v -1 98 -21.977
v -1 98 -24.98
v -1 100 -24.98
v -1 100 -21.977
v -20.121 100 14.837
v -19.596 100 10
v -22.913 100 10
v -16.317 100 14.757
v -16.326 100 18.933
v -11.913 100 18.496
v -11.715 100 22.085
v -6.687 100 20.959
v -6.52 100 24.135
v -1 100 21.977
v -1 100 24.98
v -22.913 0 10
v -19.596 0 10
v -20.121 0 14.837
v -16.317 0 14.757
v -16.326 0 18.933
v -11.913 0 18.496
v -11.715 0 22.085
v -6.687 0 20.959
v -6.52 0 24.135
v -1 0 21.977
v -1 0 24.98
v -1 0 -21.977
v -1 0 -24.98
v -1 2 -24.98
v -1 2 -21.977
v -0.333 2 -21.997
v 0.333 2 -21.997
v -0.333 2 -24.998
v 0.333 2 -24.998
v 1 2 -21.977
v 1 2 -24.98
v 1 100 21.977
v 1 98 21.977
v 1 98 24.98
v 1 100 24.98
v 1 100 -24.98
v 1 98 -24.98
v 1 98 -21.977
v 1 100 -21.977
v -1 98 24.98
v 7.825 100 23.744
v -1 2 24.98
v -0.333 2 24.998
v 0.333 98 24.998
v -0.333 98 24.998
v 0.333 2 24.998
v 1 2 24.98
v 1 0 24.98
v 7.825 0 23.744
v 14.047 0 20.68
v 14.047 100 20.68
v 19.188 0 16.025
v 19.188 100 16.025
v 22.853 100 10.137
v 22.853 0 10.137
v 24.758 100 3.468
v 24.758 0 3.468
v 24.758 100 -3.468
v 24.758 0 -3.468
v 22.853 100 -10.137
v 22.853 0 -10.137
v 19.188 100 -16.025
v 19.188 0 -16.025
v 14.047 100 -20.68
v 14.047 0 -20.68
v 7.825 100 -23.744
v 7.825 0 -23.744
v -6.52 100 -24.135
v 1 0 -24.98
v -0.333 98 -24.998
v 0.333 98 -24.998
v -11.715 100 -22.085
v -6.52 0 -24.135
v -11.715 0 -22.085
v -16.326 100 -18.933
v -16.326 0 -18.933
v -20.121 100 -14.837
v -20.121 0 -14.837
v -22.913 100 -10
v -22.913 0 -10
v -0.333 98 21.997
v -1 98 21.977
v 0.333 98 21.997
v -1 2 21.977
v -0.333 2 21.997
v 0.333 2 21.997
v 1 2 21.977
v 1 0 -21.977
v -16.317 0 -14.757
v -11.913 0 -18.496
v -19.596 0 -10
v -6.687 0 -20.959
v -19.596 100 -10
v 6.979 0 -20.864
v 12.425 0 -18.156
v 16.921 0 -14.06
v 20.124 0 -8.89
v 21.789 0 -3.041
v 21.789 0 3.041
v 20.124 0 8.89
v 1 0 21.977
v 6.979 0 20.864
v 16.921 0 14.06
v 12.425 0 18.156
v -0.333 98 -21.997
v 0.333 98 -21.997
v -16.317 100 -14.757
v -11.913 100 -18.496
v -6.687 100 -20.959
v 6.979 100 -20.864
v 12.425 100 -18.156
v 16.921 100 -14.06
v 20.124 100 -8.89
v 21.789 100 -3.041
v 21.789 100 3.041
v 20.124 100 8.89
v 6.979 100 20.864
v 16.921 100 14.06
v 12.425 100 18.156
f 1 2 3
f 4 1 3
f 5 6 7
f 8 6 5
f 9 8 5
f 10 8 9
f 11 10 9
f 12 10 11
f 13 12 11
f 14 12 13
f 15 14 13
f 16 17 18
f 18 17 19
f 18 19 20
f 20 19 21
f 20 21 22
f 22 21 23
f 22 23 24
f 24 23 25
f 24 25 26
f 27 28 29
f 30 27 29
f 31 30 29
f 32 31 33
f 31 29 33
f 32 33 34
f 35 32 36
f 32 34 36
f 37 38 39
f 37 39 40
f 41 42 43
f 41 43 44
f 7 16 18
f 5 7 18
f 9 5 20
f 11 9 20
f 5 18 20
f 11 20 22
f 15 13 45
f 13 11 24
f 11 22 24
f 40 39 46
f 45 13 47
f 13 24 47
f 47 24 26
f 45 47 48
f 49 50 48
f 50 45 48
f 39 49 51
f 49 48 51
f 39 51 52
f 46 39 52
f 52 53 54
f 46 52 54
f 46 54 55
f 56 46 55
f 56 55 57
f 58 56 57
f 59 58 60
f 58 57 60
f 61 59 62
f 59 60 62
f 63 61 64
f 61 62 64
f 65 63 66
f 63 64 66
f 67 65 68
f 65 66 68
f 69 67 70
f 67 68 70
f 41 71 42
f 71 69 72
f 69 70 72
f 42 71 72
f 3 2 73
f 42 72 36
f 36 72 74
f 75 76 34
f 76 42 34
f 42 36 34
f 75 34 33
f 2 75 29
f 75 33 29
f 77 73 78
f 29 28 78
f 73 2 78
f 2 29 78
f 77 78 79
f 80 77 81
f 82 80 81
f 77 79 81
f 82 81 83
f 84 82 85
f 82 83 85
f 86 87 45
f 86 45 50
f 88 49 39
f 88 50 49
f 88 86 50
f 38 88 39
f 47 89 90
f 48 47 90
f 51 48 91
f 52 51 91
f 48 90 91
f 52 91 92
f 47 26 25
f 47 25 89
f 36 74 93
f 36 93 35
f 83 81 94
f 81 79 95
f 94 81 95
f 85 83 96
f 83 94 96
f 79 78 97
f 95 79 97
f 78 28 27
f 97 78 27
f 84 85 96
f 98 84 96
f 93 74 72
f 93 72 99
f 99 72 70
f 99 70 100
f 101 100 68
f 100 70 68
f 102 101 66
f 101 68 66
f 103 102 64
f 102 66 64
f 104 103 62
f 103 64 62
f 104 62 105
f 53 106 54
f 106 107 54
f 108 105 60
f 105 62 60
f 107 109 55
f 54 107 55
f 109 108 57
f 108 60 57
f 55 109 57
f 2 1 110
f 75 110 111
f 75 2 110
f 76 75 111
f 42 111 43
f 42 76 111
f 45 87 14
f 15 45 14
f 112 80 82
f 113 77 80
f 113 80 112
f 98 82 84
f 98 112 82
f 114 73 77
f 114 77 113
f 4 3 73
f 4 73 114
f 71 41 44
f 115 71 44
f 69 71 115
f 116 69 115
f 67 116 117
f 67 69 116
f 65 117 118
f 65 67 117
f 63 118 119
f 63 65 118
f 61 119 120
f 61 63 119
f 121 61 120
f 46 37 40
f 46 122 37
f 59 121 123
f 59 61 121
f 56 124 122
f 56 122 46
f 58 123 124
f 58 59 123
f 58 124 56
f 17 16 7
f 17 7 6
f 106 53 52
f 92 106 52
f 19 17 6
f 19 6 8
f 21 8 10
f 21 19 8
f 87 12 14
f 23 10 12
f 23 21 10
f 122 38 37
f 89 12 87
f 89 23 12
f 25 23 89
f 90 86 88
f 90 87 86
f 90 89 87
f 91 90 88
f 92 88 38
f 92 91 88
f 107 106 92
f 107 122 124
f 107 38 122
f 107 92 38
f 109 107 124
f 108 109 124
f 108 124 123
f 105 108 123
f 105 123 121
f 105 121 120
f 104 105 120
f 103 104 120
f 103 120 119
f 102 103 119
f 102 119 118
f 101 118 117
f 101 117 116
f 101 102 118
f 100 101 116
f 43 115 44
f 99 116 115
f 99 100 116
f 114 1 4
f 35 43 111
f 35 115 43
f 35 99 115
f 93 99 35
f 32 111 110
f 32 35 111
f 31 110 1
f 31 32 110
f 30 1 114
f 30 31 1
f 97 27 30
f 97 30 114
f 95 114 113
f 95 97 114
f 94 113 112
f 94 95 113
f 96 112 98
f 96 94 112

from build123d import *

# Parameters (mm, degrees)
SKETCH_1_R               = 25
SKETCH_1_R_2             = 22
EXTRUDE_1_DEPTH          = 100
CUT_EXTRUDE_1_DEPTH      = 107.066017178
CUT_EXTRUDE_1_DEPTH_BACK = 107.066017178
SKETCH_2_W               = 2
SKETCH_2_H               = 2
CUT_EXTRUDE_4_DEPTH      = 107.066017178
CUT_EXTRUDE_4_DEPTH_BACK = 107.066017178
SKETCH_3_W               = 30.652062969
SKETCH_3_H               = 20


with BuildPart() as part:
    # 草圖1 → 填料-伸長1 (new body)
    with BuildSketch(Plane(origin=(0, 0, 0), x_dir=(1, 0, 0), z_dir=(0, 1, 0))):
        with Locations(Location((0, 0, 0), (0, 0, 270))):
            Circle(SKETCH_1_R)
        with Locations(Location((0, 0, 0), (0, 0, 270))):
            Circle(SKETCH_1_R_2, mode=Mode.SUBTRACT)
    extrude(amount=EXTRUDE_1_DEPTH)

    # 草圖2 → 除料-伸長1 (cut, two sides: drawn at the far end of the back side and taken through both)
    with BuildSketch(Plane.XY.offset(-CUT_EXTRUDE_1_DEPTH_BACK)):
        with Locations((0, 99)):
            Rectangle(SKETCH_2_W, SKETCH_2_H)
        with Locations((0, 1)):
            Rectangle(SKETCH_2_W, SKETCH_2_H)
    extrude(amount=CUT_EXTRUDE_1_DEPTH + CUT_EXTRUDE_1_DEPTH_BACK, mode=Mode.SUBTRACT)

    # 草圖3 → 除料-伸長4 (cut, two sides: drawn at the far end of the back side and taken through both)
    with BuildSketch(Plane(origin=(0, 0, 0), x_dir=(1, 0, 0), z_dir=(0, 1, 0)).offset(-CUT_EXTRUDE_4_DEPTH_BACK)):
        with Locations((-28.265221999, 0)):
            Rectangle(SKETCH_3_W, SKETCH_3_H)
    extrude(amount=CUT_EXTRUDE_4_DEPTH + CUT_EXTRUDE_4_DEPTH_BACK, mode=Mode.SUBTRACT)


solid = part.part
